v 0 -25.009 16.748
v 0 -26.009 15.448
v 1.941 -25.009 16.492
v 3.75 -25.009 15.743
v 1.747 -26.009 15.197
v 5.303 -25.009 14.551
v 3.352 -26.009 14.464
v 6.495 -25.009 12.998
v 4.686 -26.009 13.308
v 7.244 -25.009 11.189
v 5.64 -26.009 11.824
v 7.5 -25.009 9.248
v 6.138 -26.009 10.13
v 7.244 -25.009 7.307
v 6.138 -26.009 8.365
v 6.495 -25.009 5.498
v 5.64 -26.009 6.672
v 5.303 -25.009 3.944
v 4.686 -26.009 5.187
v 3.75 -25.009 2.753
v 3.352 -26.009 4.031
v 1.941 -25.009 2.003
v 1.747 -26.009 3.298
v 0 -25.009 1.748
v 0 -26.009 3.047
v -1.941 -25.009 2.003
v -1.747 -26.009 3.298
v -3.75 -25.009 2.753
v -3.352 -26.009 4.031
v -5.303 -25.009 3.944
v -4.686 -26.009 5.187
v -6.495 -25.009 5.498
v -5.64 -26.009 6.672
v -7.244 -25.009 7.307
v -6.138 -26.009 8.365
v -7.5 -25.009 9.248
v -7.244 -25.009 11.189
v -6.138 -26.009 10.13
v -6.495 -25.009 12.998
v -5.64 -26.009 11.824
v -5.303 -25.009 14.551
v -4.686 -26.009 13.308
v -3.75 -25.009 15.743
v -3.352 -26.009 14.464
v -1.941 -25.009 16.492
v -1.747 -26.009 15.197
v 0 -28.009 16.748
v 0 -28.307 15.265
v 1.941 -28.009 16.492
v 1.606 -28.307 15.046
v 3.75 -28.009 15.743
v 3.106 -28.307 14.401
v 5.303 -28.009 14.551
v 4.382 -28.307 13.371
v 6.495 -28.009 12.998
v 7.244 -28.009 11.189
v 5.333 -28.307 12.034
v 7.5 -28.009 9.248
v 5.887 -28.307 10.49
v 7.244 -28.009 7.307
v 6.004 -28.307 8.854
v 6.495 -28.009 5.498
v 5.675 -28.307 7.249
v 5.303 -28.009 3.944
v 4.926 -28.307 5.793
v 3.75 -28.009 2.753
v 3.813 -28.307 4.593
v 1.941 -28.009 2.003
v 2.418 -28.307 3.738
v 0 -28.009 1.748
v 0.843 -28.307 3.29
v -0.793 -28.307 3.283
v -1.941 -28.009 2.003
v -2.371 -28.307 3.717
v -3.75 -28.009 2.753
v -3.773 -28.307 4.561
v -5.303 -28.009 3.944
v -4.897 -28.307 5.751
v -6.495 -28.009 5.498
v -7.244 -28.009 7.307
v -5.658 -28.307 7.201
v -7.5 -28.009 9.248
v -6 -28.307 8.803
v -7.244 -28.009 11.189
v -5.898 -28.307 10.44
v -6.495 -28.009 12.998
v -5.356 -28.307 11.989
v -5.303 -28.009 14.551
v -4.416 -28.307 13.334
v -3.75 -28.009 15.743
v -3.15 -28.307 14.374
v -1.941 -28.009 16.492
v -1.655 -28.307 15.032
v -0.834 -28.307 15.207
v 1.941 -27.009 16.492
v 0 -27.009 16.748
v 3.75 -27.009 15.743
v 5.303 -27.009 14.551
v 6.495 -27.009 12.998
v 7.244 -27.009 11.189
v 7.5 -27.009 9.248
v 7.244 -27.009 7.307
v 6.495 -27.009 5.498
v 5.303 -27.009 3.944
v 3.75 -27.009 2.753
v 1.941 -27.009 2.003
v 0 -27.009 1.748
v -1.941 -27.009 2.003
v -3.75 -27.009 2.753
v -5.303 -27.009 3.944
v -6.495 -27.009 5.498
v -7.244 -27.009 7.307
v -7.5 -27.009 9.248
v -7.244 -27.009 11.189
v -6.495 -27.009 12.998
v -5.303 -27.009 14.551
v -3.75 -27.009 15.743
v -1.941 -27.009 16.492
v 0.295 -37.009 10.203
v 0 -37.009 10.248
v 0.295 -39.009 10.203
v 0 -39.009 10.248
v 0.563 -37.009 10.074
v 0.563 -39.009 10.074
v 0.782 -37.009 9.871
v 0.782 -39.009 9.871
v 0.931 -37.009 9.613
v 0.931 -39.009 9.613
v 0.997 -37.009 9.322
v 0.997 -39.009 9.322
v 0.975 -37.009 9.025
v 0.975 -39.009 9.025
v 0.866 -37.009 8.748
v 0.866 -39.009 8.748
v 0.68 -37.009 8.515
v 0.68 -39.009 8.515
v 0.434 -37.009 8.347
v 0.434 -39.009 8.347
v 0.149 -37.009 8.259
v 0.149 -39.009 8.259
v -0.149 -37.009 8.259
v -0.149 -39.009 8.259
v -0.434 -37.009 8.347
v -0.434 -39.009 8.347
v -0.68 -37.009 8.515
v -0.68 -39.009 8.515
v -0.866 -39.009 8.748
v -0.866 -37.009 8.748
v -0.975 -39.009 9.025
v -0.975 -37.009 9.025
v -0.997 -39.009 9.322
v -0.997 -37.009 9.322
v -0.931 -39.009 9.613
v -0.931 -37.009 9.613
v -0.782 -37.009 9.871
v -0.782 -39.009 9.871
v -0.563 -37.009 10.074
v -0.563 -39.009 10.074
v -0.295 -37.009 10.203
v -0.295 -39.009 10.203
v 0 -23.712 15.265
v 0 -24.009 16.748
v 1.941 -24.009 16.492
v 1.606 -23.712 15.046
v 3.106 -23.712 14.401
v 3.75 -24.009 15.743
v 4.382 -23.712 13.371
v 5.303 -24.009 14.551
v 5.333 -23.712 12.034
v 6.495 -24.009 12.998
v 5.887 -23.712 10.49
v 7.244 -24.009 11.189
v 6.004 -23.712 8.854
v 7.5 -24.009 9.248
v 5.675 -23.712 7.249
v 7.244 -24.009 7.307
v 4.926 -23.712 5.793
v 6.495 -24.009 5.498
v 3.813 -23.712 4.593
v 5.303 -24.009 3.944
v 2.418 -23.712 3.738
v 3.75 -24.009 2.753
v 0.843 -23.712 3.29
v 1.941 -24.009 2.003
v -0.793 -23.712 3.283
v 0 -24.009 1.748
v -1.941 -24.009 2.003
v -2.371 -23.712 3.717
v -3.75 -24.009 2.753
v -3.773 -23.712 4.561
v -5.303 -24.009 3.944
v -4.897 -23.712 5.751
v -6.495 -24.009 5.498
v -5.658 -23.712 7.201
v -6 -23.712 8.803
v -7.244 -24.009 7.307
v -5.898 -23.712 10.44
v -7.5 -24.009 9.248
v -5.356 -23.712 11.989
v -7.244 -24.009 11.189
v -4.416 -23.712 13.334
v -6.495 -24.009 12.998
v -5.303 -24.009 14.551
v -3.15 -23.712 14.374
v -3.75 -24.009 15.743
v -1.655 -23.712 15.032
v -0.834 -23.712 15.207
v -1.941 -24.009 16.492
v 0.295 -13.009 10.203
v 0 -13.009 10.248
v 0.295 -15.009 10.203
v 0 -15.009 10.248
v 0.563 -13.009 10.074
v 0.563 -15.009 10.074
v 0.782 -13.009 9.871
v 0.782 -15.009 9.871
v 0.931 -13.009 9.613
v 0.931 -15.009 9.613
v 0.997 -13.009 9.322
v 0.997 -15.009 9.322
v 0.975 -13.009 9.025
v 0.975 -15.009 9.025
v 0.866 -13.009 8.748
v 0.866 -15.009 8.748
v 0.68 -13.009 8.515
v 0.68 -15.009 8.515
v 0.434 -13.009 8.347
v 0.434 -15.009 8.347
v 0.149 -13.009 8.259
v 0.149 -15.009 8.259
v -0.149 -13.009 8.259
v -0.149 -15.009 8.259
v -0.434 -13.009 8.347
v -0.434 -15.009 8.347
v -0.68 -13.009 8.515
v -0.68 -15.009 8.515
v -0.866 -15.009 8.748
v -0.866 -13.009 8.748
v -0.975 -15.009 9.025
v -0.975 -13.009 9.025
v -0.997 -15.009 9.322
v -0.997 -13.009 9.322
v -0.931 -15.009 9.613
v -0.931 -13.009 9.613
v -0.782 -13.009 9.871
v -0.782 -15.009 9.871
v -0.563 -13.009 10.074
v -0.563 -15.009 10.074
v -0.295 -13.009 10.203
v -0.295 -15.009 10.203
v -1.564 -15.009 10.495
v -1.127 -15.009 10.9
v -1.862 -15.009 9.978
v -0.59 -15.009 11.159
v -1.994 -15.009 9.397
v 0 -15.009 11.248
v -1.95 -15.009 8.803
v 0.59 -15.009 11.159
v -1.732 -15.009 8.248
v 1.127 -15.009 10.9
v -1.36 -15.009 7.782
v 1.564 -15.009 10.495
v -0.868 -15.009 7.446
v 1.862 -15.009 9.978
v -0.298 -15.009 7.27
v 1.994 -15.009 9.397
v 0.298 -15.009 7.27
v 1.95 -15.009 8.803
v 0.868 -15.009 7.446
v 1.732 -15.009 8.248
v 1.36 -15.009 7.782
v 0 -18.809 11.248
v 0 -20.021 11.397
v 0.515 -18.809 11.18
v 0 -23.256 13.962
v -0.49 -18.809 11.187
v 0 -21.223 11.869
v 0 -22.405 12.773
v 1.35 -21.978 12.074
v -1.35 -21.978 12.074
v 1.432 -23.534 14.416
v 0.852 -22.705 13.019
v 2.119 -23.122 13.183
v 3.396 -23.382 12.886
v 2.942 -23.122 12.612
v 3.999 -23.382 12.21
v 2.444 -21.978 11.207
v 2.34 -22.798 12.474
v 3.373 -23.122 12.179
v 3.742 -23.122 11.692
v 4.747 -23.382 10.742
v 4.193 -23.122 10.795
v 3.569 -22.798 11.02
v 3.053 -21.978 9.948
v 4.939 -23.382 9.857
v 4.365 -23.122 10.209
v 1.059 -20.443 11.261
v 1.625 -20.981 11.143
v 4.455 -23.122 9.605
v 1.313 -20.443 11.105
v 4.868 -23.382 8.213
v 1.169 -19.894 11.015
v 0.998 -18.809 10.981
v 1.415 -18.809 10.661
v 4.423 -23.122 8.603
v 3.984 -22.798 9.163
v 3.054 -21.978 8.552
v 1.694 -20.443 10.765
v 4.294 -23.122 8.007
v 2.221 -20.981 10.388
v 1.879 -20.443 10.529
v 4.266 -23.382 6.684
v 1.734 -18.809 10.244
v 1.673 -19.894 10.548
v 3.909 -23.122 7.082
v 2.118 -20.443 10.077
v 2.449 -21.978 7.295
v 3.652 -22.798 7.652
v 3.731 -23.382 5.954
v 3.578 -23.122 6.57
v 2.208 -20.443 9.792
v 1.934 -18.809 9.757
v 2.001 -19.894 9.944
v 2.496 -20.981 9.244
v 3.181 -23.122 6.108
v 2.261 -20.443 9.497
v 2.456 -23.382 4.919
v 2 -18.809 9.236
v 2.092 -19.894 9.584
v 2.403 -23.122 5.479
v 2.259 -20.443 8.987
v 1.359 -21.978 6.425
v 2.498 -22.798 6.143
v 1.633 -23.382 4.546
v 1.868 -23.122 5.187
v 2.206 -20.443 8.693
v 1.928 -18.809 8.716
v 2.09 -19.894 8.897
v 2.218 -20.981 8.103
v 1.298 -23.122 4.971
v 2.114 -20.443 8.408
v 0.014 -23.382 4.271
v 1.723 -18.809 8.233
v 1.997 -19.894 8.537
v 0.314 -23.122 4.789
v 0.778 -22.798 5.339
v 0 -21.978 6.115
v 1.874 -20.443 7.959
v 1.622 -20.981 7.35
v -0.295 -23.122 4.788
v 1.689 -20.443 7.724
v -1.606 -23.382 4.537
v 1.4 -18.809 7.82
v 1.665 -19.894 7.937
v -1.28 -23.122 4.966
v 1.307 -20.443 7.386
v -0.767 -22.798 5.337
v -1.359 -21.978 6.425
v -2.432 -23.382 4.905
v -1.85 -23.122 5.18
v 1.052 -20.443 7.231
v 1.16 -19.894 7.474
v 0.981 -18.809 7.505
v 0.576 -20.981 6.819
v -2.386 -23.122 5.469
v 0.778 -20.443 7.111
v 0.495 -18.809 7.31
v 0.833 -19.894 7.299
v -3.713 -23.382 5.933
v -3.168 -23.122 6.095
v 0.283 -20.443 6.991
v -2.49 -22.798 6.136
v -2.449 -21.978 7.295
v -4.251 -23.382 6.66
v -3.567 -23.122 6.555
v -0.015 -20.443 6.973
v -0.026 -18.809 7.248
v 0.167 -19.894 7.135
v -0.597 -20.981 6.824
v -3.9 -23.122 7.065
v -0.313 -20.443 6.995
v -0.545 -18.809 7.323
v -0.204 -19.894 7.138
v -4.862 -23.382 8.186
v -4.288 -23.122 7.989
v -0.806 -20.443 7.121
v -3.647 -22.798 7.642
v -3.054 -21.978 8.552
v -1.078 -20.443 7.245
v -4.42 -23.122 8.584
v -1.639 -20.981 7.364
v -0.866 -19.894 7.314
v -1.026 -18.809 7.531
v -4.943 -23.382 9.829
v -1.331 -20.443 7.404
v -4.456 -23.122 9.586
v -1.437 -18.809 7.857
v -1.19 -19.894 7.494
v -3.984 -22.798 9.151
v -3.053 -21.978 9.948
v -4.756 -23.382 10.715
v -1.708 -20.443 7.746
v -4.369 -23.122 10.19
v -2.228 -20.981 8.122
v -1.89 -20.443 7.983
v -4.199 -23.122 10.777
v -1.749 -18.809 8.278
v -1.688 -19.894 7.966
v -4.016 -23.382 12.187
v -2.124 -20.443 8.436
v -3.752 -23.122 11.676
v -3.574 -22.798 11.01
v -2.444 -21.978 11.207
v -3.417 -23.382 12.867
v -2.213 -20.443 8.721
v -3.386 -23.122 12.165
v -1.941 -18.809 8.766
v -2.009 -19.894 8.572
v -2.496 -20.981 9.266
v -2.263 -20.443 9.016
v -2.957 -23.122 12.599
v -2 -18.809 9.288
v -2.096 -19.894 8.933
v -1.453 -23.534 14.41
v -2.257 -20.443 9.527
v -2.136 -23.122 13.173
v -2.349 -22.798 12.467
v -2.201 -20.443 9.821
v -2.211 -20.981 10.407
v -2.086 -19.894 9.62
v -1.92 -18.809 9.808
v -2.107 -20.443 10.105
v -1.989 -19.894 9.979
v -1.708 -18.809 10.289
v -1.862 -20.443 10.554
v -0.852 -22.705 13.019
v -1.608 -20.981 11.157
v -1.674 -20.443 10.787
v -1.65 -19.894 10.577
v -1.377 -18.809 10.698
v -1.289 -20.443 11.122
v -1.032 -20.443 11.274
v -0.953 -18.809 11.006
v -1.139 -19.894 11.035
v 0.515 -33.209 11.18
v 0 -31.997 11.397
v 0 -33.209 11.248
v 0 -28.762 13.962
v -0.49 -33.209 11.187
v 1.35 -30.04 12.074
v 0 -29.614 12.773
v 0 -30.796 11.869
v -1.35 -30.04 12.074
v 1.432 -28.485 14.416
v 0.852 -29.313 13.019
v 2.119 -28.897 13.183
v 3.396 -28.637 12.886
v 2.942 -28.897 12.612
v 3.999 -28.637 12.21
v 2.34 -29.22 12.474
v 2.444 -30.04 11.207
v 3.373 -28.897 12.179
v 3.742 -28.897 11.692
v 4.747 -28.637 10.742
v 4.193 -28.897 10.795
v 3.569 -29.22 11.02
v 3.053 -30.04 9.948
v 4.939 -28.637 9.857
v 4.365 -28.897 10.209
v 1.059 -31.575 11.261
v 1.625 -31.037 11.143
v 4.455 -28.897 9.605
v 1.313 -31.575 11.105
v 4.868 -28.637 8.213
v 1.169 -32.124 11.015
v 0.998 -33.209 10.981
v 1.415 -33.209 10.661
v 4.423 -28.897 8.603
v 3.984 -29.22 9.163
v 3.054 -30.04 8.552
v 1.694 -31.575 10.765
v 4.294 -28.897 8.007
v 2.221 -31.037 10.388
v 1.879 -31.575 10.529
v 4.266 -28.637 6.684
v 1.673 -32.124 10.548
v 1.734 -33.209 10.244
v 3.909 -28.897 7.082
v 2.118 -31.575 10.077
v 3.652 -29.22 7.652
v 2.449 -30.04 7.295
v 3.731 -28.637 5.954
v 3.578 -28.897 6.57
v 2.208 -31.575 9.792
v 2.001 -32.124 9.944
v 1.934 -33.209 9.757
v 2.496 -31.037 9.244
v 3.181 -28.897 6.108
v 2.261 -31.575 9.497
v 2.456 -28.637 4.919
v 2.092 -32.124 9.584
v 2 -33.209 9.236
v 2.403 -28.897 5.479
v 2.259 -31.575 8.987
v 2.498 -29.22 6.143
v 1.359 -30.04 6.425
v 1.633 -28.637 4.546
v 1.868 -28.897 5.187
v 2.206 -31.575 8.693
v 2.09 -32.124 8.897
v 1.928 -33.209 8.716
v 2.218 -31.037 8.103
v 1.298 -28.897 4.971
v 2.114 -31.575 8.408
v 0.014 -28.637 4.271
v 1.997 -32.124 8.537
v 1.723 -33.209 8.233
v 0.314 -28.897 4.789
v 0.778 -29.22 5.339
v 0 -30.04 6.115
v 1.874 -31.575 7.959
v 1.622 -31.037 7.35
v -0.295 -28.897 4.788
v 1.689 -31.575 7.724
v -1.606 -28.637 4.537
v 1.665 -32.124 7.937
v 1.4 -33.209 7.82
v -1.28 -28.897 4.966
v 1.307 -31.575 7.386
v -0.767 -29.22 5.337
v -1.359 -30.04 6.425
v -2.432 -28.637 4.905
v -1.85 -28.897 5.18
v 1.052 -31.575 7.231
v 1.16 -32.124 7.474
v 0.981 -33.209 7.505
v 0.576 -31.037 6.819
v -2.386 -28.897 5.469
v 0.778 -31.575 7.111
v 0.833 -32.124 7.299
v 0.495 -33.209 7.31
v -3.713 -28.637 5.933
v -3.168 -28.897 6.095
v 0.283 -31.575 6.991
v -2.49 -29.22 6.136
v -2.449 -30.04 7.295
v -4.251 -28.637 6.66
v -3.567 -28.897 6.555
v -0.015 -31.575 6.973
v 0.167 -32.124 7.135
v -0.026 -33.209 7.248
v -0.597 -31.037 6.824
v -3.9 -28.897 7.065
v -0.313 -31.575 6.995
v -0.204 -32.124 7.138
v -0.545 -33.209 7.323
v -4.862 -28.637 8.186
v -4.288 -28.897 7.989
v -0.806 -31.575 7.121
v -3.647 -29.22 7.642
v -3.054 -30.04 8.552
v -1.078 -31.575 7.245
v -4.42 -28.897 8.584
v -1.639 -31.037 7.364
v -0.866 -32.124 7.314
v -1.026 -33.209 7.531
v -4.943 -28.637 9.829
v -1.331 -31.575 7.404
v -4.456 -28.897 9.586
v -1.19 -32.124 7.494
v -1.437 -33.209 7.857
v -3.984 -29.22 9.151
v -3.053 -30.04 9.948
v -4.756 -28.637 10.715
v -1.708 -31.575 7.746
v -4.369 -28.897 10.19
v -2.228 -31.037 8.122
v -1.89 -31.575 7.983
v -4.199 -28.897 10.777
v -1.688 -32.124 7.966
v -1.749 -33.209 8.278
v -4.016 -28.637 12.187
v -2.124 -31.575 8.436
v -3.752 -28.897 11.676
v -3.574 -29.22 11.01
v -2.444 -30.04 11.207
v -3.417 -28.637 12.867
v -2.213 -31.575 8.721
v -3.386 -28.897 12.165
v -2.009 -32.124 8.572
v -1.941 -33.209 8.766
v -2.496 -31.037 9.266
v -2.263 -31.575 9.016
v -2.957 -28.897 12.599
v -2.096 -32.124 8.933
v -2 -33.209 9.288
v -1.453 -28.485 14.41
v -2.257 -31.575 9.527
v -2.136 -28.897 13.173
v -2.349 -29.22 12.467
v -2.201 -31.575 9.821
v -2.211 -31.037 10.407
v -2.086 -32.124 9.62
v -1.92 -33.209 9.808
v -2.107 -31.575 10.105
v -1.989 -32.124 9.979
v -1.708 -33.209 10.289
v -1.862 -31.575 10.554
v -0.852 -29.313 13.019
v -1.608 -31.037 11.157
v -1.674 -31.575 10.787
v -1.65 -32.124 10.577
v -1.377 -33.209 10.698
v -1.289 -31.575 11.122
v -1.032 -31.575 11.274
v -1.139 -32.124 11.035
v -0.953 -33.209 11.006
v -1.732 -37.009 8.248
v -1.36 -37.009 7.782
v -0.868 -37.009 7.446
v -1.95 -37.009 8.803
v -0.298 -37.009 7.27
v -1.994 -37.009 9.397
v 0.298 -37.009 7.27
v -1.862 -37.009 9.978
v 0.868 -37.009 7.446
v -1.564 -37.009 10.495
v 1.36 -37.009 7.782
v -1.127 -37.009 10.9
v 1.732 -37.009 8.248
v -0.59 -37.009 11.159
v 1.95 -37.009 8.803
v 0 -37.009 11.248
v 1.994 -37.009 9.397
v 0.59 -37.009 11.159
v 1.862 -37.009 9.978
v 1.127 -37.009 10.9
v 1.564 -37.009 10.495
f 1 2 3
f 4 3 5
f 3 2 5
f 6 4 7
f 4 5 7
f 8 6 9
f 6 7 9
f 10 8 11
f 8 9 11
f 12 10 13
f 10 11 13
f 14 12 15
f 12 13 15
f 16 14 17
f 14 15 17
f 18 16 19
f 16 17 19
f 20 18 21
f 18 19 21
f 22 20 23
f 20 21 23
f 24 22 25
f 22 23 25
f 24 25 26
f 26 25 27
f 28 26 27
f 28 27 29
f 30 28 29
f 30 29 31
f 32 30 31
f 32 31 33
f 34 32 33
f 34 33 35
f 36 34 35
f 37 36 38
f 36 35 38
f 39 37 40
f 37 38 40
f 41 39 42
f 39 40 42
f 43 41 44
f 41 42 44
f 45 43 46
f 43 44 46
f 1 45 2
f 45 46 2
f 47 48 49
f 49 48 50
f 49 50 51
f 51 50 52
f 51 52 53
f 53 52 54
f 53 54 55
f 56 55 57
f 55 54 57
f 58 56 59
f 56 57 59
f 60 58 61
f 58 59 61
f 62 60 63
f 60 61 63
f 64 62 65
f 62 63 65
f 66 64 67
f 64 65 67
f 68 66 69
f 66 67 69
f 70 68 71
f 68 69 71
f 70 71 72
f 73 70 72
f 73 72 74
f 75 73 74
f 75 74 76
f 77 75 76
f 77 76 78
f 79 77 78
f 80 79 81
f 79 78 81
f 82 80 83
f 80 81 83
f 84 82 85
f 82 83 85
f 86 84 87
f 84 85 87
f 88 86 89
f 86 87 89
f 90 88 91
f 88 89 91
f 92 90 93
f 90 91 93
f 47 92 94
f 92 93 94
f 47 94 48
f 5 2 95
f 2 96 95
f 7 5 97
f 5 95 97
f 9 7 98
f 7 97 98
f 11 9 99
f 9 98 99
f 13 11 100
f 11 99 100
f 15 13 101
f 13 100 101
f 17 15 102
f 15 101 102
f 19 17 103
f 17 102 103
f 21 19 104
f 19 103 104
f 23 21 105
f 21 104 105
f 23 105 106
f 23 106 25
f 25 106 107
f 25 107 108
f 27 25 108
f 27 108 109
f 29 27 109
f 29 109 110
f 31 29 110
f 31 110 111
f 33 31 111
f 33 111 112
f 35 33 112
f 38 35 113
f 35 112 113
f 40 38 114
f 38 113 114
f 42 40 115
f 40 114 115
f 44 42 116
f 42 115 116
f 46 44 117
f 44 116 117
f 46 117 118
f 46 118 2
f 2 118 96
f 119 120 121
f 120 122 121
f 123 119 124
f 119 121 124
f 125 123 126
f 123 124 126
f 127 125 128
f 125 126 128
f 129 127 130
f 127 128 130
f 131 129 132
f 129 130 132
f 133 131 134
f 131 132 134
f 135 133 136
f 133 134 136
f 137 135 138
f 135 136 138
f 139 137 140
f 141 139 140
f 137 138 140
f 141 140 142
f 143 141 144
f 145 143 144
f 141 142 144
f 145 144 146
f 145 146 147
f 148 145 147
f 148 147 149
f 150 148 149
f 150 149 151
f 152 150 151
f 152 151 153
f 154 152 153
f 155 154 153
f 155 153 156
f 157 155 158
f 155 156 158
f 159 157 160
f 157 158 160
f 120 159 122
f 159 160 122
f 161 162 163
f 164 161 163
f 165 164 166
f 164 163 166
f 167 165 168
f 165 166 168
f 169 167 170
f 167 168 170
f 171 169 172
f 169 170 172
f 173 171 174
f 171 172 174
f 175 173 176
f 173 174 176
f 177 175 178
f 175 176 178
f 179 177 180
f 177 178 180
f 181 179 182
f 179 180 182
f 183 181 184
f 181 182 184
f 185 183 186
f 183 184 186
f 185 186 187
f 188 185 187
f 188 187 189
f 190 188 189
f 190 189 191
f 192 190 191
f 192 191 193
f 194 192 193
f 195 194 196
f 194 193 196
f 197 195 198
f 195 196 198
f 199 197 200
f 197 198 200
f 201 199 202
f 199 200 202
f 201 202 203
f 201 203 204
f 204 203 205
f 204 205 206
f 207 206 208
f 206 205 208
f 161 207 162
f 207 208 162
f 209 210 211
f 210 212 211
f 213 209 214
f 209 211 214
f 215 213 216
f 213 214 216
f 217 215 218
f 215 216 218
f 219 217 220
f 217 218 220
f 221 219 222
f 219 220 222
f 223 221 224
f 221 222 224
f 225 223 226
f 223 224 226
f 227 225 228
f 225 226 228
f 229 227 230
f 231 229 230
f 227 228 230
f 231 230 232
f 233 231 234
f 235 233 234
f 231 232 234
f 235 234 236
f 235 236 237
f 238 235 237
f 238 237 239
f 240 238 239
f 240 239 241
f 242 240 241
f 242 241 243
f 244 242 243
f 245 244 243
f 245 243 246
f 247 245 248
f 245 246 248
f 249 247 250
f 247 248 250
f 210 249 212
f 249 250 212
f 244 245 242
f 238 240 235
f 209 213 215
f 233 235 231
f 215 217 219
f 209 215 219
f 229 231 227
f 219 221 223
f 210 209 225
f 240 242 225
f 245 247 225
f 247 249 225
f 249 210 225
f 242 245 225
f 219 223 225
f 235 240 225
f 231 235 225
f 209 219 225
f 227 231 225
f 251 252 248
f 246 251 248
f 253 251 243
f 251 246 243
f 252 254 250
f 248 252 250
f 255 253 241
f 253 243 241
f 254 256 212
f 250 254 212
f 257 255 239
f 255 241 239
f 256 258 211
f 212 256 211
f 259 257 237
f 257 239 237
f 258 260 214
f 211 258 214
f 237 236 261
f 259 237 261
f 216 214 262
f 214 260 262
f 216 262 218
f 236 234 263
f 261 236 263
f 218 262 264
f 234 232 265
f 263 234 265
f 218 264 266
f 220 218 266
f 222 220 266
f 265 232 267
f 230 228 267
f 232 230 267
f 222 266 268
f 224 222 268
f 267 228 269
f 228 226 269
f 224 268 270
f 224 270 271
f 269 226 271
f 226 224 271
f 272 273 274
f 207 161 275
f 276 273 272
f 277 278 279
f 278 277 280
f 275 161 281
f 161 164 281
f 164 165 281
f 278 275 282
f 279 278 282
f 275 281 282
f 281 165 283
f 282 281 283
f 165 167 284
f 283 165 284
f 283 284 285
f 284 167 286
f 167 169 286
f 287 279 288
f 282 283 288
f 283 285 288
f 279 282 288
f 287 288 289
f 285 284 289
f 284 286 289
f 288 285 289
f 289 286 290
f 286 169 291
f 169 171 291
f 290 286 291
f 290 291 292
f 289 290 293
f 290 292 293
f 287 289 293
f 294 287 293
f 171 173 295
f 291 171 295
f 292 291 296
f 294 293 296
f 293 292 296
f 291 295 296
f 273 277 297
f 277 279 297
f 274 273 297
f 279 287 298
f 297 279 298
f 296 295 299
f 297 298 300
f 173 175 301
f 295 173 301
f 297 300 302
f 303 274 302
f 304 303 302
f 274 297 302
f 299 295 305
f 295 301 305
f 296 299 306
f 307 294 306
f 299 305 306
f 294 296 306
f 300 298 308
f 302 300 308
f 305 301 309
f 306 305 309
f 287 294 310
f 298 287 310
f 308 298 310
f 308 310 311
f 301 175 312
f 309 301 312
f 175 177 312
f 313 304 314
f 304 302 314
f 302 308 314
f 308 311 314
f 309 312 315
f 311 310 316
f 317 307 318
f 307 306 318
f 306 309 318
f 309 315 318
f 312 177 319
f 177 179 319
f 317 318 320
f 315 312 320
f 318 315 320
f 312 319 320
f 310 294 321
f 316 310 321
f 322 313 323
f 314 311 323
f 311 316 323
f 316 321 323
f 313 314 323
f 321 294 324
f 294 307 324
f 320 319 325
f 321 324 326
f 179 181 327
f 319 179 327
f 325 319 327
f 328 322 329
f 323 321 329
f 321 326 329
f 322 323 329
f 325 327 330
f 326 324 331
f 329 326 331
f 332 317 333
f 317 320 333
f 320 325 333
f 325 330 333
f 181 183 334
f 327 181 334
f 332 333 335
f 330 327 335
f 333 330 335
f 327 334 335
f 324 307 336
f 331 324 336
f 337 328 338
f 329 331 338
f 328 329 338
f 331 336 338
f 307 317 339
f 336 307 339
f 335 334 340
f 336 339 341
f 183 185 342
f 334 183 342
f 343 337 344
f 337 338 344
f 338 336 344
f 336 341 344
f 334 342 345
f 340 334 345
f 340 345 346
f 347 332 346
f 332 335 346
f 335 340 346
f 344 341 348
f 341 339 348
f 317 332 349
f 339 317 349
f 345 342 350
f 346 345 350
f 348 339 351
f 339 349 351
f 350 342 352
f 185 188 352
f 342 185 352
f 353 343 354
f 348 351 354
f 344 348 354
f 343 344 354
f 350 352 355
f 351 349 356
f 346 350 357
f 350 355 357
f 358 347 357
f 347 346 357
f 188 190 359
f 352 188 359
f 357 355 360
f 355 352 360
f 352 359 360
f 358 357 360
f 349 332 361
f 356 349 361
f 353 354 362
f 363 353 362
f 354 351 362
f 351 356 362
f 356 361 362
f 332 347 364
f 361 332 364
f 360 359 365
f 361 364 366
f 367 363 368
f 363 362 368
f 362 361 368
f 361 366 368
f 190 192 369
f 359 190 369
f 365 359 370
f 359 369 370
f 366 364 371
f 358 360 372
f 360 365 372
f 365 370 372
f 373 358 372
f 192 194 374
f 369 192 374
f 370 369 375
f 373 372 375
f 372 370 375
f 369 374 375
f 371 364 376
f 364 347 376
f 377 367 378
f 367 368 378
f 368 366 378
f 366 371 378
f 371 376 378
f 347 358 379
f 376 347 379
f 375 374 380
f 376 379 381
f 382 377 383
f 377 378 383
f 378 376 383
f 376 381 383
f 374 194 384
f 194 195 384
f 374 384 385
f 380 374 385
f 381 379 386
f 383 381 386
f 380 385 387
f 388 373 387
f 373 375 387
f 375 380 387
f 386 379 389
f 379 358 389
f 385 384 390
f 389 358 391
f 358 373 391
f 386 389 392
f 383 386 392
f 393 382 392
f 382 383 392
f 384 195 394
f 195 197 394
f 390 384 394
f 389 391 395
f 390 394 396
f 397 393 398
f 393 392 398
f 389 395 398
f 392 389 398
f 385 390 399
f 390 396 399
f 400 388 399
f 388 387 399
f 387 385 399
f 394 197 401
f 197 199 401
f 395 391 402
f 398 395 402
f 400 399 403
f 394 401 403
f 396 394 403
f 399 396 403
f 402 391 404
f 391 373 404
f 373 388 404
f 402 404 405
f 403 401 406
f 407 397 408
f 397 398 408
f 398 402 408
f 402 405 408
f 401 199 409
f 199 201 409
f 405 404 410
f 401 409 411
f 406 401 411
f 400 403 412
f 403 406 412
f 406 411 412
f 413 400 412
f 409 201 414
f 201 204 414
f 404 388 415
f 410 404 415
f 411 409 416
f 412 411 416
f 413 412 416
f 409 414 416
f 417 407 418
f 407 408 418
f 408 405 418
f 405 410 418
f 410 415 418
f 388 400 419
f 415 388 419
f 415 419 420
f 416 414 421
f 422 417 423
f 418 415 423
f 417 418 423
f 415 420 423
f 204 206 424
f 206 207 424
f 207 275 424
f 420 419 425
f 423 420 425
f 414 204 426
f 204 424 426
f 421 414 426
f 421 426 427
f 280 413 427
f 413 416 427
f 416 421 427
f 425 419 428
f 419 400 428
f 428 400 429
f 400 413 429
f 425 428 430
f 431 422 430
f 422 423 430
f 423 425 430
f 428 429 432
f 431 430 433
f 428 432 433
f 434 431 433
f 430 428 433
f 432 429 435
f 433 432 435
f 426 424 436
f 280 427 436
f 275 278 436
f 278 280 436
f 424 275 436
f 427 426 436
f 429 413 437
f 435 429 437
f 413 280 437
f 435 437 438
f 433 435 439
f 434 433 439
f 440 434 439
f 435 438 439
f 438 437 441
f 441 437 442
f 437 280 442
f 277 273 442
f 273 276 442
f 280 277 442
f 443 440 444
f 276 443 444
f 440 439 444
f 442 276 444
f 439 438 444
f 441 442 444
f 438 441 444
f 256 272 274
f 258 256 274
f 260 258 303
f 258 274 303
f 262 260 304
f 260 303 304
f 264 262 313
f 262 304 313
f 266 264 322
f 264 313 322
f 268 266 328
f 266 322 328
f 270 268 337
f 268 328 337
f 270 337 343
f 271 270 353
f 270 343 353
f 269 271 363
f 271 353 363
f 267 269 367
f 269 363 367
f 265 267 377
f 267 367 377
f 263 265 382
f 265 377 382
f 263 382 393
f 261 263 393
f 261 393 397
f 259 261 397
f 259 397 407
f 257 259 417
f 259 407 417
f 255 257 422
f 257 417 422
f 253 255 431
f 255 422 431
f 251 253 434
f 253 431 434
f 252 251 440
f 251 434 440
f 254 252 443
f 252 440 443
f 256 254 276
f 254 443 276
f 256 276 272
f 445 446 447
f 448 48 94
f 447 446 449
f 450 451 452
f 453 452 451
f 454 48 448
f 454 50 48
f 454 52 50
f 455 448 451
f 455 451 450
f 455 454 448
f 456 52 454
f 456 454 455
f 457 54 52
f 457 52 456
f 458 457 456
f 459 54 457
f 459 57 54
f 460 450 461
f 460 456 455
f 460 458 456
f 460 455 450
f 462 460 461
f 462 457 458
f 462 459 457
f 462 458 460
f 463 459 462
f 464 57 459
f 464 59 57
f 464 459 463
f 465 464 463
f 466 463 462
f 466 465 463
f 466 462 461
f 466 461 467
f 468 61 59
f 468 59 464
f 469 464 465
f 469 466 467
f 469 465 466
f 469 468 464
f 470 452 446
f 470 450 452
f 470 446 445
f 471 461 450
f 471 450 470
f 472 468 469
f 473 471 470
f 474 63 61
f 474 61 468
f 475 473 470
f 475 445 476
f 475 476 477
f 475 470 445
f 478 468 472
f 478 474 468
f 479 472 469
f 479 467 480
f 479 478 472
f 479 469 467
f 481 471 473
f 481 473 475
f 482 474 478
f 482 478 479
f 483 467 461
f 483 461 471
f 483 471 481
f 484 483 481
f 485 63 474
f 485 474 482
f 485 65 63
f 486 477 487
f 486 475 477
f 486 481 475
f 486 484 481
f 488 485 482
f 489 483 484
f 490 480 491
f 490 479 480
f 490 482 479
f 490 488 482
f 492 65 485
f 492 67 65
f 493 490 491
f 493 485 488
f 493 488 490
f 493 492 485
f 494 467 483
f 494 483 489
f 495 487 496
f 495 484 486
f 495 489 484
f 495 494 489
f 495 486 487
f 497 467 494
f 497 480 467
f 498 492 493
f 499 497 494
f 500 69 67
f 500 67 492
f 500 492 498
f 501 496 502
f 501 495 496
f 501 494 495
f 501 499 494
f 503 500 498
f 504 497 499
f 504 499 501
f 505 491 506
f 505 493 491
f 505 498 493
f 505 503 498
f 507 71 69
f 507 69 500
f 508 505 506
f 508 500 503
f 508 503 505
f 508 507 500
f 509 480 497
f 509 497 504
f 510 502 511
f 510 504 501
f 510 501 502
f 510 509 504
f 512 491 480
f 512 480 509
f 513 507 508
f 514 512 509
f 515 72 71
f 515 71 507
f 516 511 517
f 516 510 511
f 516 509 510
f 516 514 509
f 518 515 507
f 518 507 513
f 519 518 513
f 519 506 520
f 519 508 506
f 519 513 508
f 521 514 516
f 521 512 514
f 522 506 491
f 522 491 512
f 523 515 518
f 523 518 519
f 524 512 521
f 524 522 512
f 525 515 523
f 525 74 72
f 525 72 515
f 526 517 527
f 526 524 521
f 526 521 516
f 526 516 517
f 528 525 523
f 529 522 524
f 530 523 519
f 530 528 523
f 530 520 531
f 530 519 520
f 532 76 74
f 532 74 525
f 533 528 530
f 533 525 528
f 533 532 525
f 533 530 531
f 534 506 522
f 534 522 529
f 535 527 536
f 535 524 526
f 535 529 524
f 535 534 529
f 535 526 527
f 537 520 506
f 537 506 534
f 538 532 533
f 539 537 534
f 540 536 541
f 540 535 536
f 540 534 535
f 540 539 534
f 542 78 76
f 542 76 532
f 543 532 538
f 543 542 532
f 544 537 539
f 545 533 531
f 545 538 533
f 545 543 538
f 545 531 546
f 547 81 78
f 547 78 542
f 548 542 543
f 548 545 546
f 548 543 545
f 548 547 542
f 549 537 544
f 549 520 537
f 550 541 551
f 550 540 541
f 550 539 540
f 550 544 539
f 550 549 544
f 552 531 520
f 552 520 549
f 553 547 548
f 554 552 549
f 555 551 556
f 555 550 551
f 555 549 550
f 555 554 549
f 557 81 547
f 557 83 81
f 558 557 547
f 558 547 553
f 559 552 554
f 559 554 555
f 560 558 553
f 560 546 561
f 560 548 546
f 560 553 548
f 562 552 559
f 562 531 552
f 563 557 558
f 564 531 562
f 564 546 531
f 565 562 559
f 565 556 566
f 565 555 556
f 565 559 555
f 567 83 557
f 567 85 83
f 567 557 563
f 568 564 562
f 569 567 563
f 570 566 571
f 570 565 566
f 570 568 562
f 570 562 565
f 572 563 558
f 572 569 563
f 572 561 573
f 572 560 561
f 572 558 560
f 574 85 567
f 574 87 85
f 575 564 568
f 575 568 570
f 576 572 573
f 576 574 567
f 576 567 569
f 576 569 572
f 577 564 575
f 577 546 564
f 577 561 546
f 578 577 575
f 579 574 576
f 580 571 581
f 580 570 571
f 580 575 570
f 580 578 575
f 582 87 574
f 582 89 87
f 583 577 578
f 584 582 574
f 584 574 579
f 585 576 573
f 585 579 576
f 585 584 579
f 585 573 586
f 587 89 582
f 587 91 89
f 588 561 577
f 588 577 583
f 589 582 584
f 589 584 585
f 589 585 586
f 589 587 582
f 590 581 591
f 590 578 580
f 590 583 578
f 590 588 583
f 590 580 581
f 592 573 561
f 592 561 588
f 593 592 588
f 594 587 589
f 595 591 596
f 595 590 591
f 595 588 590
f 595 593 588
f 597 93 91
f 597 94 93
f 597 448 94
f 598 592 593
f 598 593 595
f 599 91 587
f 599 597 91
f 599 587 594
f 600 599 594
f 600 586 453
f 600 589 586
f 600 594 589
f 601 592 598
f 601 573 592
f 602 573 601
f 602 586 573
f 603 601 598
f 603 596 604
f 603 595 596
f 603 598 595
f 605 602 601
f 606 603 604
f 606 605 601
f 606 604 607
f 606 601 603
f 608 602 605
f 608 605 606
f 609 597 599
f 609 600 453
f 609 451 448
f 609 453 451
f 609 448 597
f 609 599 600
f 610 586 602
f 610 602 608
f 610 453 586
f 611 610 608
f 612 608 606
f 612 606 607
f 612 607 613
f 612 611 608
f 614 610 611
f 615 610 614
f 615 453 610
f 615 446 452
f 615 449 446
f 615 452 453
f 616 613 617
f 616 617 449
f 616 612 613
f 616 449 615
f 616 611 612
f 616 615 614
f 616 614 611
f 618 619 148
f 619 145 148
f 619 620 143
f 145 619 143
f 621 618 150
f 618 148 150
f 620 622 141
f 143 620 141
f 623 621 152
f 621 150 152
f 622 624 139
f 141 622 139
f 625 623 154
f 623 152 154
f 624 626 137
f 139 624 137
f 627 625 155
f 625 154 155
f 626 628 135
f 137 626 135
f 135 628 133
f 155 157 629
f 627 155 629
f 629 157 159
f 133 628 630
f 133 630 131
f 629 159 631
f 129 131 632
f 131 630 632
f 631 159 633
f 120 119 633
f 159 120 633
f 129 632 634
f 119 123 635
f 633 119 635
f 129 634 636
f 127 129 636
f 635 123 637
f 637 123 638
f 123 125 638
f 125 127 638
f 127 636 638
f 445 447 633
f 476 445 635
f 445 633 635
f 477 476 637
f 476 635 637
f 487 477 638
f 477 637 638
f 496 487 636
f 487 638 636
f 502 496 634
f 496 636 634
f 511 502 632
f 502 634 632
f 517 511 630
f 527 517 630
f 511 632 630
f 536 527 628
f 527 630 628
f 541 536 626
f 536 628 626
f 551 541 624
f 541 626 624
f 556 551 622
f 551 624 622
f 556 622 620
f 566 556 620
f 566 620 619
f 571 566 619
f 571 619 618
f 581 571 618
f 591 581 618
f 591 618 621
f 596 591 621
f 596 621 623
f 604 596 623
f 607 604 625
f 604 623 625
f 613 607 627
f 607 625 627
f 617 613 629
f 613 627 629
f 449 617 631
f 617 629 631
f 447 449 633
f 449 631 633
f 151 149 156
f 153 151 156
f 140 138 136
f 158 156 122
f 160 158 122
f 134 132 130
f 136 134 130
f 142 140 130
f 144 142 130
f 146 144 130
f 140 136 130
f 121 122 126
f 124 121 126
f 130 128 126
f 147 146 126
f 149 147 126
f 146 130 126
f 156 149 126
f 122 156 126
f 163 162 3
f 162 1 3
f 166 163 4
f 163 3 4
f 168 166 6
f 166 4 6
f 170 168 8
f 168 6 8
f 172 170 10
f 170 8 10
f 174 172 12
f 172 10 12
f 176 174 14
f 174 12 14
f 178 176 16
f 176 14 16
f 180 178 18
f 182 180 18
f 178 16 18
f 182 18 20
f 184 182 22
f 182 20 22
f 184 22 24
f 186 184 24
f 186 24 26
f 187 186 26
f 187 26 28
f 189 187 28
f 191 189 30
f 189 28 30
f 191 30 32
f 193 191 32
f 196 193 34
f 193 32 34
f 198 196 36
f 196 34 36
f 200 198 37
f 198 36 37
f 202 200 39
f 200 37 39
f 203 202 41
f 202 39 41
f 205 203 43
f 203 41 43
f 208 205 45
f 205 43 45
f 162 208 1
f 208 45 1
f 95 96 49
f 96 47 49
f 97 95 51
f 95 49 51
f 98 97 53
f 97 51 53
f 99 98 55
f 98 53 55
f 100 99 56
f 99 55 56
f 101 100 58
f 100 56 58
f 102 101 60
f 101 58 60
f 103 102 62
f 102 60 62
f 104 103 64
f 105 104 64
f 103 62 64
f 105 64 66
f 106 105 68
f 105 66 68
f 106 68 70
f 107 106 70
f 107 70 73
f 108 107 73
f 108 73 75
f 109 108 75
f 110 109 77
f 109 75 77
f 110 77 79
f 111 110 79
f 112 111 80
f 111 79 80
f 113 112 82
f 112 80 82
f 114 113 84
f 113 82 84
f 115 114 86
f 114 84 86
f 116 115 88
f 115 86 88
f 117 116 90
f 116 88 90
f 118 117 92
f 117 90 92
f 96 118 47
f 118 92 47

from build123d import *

# Parameters (mm, degrees)
F2_R = 5
F3_R = 5


with BuildPart() as f1:
    # F0 (on Right) → F1 (revolve)
    with BuildSketch(Plane.YZ):
        Polygon((-39.0091740638, 9.247707203), (-26.0091740638, 9.247707203), (-13.0091740638, 9.247707203), (-13.0091740638, 10.247707203), (-15.0091740638, 10.247707203), (-15.0091740638, 11.247707203), (-22.9062791914, 11.247707203), (-24.0091740638, 16.747707203), (-25.0091740638, 16.747707203), (-26.0091740638, 15.4484901577), (-27.0091740638, 16.747707203), (-28.0091740638, 16.747707203), (-29.1120689362, 11.247707203), (-37.0091740638, 11.247707203), (-37.0091740638, 10.247707203), (-39.0091740638, 10.247707203), align=None)
    revolve(axis=Axis((0, -19.5091740638, 9.247707203), (0, 1, 0)))

    # F2
    f2_edges = [f1.edges().sort_by_distance(p)[0] for p in [
        (0, -29.112069, 7.247707),
    ]]
    fillet(f2_edges, radius=F2_R)

    # F3
    f3_edges = [f1.edges().sort_by_distance(p)[0] for p in [
        (0, -22.906279, 7.247707),
    ]]
    fillet(f3_edges, radius=F3_R)


solid = f1.part
